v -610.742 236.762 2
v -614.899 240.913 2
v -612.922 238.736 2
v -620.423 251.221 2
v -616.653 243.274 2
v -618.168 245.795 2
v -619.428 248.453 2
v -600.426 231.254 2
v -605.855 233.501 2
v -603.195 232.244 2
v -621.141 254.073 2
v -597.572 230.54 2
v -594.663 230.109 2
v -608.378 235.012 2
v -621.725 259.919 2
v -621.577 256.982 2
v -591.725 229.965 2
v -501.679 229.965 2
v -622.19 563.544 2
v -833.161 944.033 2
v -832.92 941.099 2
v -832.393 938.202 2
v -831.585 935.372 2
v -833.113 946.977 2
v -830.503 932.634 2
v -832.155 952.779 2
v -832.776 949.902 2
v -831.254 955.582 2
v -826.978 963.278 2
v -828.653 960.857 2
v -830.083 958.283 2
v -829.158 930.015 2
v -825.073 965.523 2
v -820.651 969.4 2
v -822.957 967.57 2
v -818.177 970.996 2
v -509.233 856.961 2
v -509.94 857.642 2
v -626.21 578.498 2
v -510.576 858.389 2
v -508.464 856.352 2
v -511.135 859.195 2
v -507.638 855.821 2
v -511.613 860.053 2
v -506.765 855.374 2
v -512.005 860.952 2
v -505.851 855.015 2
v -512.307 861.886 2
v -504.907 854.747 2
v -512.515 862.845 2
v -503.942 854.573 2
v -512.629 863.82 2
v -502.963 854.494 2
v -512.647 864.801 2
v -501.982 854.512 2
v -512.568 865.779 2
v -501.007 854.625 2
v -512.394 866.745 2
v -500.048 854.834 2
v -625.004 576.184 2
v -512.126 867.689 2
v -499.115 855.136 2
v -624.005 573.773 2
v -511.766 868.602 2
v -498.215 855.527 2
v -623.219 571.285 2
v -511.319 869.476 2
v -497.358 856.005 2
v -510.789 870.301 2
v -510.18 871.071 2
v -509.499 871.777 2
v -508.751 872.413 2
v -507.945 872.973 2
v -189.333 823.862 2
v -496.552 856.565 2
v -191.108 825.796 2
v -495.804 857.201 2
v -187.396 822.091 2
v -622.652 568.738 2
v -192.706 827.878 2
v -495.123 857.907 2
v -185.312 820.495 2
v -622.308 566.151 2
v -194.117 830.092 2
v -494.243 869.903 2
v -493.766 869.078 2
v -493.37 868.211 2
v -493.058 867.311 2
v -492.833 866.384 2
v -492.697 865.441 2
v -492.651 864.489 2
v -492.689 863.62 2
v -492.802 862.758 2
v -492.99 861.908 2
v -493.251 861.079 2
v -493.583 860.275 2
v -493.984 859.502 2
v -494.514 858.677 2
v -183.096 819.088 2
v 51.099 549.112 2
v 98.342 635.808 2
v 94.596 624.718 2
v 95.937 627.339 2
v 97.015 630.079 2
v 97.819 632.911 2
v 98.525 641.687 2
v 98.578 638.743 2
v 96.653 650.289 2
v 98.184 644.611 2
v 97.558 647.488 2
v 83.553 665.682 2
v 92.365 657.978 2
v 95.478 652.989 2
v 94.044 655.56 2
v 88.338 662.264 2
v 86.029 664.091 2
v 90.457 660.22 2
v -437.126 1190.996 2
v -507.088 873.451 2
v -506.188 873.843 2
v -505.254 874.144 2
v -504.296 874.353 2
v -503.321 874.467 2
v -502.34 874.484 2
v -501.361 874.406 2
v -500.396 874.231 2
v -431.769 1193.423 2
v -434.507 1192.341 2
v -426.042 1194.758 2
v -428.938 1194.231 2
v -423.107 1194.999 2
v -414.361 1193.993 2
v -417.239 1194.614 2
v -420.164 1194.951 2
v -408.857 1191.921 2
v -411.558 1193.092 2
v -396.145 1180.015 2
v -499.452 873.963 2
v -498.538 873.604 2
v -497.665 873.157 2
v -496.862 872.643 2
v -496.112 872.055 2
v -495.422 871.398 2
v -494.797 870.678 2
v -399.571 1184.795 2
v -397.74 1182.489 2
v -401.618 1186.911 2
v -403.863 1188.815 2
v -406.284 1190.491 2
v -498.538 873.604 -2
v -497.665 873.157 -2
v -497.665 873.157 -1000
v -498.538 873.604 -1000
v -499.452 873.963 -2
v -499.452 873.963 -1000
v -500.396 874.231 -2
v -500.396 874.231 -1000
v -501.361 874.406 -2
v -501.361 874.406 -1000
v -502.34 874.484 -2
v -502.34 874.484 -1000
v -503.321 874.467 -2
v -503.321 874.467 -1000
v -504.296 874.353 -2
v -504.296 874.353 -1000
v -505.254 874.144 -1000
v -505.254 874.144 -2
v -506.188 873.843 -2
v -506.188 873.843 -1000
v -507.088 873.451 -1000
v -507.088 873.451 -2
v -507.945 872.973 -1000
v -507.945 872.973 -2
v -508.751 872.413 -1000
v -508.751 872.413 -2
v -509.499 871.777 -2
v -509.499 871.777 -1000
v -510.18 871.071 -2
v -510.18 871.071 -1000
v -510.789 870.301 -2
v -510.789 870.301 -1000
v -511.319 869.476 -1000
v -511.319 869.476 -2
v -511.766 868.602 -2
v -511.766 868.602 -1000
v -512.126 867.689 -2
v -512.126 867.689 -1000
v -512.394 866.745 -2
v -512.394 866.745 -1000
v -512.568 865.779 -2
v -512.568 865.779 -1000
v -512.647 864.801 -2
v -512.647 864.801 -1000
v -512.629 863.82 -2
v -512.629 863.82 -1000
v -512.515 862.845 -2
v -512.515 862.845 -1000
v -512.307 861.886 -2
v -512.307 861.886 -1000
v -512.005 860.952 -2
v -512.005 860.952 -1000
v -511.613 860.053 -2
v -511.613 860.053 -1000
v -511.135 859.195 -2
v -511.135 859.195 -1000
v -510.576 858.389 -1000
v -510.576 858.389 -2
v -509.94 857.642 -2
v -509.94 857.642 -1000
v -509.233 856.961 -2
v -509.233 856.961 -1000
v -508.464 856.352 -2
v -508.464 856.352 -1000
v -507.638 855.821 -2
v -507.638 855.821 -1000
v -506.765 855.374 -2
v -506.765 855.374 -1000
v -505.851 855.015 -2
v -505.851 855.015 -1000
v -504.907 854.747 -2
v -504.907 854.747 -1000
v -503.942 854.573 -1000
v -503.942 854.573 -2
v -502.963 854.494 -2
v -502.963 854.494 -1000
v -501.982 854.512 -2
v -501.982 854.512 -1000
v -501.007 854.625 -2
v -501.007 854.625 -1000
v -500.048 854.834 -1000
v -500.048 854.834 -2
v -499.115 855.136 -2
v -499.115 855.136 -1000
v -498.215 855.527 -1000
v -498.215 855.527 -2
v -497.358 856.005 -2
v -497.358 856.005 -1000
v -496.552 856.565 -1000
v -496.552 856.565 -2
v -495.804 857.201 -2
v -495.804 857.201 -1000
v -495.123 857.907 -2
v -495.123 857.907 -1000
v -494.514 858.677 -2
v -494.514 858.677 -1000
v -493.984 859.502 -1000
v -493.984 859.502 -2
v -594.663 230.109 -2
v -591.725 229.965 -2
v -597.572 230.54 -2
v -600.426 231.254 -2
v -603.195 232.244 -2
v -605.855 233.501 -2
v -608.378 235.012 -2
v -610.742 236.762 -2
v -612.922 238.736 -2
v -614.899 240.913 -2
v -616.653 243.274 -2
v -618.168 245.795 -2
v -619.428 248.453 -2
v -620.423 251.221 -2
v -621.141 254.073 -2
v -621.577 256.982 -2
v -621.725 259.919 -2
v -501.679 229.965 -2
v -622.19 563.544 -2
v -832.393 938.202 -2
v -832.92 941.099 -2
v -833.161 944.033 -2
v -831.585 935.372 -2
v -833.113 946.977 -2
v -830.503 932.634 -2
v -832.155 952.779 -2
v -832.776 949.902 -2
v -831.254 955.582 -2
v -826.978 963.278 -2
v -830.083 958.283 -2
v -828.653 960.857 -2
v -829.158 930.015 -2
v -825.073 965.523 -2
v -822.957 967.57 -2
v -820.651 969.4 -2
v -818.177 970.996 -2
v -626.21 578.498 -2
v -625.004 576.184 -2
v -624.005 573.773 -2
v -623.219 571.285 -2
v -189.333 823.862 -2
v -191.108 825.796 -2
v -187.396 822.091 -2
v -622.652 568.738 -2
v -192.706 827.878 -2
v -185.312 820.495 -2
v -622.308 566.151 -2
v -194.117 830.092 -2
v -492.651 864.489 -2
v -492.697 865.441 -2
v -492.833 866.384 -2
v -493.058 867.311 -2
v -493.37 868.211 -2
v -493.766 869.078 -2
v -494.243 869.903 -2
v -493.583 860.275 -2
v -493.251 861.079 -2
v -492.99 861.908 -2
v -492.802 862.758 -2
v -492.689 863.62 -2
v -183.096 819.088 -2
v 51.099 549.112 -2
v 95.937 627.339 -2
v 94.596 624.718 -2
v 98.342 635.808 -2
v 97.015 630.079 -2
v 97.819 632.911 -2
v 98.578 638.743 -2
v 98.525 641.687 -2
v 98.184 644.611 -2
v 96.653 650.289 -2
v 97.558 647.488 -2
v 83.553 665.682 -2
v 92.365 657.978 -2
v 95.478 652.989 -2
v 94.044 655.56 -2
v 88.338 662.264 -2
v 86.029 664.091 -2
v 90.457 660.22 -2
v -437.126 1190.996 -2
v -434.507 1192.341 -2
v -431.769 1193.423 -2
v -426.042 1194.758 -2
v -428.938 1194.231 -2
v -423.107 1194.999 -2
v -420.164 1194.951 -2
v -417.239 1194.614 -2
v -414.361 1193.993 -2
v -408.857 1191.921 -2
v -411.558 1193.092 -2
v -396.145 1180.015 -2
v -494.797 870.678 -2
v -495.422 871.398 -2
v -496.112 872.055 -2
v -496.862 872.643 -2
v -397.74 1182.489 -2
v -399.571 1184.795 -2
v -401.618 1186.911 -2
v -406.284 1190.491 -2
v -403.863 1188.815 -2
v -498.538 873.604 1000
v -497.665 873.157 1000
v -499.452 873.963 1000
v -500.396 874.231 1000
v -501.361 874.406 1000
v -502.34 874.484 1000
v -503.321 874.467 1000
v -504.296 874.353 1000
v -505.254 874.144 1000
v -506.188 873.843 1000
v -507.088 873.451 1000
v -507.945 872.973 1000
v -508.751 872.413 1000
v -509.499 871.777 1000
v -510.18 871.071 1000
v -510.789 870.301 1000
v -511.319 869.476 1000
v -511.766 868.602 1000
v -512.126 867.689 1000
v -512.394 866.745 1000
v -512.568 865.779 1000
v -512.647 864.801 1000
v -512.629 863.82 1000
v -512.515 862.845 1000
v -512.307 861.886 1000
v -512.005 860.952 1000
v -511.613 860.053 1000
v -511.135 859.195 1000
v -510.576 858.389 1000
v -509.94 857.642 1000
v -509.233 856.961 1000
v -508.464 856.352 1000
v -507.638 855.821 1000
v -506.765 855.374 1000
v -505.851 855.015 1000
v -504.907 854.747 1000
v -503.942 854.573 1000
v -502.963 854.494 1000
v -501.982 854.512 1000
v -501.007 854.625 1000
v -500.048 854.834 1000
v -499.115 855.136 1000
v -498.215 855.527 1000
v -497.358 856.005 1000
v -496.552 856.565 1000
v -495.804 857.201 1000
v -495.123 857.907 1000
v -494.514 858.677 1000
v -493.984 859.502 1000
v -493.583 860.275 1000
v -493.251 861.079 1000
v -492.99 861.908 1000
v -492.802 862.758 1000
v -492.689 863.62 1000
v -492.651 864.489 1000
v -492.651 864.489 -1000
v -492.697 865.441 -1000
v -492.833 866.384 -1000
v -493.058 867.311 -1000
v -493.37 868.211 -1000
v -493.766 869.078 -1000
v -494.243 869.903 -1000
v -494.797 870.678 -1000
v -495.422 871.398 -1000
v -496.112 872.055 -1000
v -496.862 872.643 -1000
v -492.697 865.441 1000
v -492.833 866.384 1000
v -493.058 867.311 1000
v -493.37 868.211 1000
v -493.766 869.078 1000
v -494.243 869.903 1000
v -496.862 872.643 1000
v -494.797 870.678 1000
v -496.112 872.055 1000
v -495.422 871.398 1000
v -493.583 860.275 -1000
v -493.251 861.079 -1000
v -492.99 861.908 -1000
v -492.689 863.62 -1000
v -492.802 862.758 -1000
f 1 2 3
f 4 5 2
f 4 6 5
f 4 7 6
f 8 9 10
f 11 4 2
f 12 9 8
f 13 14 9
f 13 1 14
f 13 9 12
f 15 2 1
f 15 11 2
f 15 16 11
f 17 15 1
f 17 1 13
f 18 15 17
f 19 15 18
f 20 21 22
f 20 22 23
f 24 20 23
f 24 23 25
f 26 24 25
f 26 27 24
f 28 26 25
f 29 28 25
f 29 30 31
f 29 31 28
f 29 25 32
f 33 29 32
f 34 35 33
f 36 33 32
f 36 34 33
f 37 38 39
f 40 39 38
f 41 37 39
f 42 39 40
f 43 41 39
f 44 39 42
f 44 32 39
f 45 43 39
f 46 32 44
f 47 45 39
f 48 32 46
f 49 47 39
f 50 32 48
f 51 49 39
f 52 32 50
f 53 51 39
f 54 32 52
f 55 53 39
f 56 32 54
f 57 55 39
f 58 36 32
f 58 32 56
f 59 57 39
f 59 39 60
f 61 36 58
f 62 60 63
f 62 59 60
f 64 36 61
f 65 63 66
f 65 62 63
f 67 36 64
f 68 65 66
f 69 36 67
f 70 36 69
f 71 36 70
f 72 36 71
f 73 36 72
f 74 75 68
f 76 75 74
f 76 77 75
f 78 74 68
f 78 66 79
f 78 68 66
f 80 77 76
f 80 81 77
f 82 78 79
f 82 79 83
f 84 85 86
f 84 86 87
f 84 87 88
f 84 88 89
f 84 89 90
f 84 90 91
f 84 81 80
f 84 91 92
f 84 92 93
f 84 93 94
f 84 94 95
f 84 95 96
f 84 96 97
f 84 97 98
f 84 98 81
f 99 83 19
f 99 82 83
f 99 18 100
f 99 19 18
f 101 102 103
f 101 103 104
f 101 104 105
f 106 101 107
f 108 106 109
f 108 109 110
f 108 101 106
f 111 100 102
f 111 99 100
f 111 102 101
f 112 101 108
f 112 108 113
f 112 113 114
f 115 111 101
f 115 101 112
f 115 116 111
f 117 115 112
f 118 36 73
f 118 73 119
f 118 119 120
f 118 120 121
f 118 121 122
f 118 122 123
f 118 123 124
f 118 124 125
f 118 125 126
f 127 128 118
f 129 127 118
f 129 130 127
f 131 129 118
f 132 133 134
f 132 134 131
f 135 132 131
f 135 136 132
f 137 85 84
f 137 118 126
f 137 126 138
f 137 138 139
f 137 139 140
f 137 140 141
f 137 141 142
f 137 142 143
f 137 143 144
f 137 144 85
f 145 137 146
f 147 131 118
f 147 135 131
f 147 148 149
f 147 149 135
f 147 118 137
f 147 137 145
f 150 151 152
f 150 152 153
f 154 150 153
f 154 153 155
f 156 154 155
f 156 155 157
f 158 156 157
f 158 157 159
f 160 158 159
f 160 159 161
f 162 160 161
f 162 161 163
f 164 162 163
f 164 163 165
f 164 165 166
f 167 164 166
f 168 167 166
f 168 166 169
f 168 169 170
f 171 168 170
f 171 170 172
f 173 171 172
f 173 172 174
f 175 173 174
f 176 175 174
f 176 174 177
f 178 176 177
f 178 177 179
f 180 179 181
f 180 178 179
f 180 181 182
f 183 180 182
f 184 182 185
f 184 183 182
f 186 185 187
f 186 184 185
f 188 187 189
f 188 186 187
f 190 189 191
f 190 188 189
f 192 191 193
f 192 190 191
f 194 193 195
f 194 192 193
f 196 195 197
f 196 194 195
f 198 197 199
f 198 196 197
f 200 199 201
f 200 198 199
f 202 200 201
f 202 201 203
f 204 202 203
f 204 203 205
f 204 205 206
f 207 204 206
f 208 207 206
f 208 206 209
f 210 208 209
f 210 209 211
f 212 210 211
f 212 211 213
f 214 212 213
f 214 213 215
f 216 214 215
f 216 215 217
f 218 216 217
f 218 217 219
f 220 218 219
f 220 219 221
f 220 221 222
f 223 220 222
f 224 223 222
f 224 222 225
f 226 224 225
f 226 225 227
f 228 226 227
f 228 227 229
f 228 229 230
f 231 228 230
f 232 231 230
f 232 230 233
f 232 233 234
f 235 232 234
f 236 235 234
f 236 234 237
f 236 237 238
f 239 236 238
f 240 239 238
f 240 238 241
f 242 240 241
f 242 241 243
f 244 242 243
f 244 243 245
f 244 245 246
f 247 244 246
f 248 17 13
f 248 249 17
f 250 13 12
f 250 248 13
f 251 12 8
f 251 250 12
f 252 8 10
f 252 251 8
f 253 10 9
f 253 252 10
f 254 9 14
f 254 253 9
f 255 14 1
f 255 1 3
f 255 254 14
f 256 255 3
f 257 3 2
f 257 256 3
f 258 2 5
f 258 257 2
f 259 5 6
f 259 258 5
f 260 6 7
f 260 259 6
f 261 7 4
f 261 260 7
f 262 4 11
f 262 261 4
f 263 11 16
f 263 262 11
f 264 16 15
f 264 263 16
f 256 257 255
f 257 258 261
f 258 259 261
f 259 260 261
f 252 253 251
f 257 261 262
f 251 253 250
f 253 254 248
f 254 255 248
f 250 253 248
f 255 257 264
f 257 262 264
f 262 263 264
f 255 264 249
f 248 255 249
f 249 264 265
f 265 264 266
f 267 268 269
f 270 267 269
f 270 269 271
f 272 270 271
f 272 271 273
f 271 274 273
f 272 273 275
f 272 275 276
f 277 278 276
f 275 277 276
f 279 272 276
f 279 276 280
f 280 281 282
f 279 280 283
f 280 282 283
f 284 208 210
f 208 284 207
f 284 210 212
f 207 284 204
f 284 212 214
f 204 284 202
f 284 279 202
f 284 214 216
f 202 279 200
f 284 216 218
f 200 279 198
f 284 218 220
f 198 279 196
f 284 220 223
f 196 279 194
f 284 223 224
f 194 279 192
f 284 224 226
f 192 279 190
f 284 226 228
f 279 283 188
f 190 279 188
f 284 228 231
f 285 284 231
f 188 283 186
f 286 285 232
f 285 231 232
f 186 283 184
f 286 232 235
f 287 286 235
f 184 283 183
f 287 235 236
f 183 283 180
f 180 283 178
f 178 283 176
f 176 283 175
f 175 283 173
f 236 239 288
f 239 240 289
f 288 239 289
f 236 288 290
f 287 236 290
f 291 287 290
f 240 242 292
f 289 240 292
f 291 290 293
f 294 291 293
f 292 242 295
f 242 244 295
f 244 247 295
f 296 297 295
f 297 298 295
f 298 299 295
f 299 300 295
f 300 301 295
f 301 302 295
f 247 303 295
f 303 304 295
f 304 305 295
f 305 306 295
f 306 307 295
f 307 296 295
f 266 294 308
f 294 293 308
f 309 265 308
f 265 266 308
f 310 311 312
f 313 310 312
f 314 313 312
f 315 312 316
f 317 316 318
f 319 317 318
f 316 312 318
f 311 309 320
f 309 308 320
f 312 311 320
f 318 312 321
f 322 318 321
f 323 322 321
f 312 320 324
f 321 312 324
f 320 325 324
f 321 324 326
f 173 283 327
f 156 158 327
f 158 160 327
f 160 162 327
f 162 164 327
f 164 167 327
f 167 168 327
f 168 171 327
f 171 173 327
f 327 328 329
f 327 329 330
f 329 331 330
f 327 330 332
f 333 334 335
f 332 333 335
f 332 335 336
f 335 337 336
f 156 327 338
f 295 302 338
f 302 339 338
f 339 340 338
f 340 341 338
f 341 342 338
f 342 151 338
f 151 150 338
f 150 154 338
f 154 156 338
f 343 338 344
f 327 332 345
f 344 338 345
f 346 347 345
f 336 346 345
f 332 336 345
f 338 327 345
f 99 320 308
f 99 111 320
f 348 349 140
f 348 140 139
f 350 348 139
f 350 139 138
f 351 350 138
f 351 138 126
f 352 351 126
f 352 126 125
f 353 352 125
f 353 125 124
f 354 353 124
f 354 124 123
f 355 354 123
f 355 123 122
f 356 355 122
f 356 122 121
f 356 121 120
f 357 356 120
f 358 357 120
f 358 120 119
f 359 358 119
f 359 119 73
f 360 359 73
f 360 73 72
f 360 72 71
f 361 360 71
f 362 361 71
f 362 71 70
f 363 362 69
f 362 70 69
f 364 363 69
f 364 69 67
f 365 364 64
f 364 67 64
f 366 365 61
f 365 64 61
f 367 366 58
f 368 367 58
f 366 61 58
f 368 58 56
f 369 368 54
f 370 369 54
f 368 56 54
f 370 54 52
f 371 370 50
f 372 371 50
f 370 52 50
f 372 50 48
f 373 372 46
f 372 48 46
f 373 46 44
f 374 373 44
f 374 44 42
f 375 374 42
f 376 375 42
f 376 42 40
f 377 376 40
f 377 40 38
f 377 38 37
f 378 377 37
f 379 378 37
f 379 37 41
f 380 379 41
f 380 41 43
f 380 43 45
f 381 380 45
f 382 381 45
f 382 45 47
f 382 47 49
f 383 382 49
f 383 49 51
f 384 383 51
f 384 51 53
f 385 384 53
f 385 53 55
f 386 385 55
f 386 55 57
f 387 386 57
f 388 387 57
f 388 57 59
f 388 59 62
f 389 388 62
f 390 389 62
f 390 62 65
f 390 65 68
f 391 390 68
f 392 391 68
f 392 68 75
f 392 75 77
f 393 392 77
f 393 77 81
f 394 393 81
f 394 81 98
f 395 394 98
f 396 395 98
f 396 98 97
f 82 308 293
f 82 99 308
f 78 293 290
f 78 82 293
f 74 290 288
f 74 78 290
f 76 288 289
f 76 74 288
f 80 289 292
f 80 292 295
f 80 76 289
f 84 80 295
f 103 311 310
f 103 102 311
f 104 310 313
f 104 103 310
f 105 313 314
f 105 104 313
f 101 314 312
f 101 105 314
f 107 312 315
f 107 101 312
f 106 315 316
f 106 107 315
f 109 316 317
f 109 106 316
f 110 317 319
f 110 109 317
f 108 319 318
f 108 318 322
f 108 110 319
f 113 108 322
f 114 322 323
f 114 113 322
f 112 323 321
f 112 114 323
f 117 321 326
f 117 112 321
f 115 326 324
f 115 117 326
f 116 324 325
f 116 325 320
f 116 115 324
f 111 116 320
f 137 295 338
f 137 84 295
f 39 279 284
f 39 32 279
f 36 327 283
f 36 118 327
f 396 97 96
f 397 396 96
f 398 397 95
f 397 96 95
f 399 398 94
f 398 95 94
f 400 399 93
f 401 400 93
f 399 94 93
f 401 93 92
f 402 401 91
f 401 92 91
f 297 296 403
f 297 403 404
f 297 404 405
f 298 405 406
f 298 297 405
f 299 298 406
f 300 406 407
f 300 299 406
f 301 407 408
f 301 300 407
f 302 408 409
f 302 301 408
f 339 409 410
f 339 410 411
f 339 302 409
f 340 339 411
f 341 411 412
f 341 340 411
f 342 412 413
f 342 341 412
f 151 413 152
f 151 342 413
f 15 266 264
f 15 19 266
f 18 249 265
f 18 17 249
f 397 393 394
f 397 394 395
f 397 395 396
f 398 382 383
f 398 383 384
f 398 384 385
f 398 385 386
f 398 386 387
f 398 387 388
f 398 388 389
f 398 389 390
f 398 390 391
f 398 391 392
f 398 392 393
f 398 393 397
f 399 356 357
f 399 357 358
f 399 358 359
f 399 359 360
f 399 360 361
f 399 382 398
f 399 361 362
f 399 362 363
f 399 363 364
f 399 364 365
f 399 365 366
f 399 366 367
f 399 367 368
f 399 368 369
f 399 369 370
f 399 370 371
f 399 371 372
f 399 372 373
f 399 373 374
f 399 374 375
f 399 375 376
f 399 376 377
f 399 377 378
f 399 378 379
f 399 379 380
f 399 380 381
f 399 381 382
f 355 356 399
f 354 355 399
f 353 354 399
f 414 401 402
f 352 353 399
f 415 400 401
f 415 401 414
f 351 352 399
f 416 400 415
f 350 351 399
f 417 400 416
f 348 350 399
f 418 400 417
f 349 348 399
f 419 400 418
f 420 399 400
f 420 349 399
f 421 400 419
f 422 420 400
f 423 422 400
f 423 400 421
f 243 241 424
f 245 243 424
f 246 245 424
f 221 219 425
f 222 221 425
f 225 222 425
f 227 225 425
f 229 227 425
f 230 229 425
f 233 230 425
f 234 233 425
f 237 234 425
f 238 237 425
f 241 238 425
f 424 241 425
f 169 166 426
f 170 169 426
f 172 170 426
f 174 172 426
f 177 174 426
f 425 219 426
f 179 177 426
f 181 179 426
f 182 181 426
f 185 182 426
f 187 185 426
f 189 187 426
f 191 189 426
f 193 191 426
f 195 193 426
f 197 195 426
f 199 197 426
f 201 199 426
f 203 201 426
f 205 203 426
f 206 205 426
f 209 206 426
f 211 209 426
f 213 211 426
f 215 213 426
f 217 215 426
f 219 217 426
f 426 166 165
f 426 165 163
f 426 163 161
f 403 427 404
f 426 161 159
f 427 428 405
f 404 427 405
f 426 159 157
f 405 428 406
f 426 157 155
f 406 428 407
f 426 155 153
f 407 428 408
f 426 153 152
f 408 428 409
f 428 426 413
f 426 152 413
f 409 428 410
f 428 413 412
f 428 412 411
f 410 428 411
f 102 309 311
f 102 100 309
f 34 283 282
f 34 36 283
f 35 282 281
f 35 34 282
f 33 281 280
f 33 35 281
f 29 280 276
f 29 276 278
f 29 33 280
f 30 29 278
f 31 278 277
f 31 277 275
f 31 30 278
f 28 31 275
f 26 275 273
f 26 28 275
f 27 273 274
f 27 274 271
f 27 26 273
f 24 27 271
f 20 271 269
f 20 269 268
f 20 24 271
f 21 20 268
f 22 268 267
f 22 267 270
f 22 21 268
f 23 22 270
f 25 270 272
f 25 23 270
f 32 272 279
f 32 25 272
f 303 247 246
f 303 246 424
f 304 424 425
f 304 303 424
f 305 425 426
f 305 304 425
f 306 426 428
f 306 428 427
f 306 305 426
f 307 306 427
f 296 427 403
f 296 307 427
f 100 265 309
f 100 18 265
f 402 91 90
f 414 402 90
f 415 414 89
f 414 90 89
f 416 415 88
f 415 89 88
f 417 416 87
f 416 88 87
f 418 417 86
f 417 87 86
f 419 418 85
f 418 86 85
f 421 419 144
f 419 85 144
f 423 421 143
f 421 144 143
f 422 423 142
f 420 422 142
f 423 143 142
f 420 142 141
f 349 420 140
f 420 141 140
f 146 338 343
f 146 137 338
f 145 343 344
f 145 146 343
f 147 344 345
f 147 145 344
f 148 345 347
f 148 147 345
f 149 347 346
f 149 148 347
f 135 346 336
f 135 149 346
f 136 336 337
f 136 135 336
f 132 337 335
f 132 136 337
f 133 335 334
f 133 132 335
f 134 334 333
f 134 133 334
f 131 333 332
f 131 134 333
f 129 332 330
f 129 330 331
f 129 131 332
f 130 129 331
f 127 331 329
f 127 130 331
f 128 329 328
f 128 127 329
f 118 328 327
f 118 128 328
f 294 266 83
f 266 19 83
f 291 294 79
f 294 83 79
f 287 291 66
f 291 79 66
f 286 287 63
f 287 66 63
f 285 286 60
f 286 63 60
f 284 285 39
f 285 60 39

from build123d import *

# Parameters (mm, degrees)
BOSS_EXTRUDE1_DEPTH = 2
SKETCH1_4_R         = 10
BOSS_EXTRUDE2_DEPTH = 1000
FILLET1_R           = 30


with BuildPart() as part:
    # Sketch1 → Boss-Extrude1 (new, symmetric)
    with BuildSketch(Plane.XY):
        Polygon((51.098896592, 549.111782584), (109.556303029, 650.722199952), (-190.085319823, 823.108777884), (-411.145086474, 1205.995525233), (-844.157788367, 955.995525233), (-622.202758989, 571.558137356), (-621.679381509, 229.965176242), (-501.679240657, 229.965176242), align=None)
    extrude(amount=BOSS_EXTRUDE1_DEPTH, both=True)

    # Sketch1<4> → Boss-Extrude2 (add, symmetric)
    with BuildSketch(Plane.XY):
        with Locations((-502.65143742, 864.489174287)):
            Circle(SKETCH1_4_R)
    extrude(amount=BOSS_EXTRUDE2_DEPTH, both=True)

    # Fillet1
    fillet1_edges = [part.edges().sort_by_distance(p)[0] for p in [
        (-190.085319823, 823.108777884, 0),
        (-622.202758989, 571.558137356, 0),
        (-621.679381509, 229.965176242, 0),
        (109.556303029, 650.722199952, 0),
        (-411.145086474, 1205.995525233, 0),
        (-844.157788367, 955.995525233, 0),
    ]]
    fillet(fillet1_edges, radius=FILLET1_R)


solid = part.part
